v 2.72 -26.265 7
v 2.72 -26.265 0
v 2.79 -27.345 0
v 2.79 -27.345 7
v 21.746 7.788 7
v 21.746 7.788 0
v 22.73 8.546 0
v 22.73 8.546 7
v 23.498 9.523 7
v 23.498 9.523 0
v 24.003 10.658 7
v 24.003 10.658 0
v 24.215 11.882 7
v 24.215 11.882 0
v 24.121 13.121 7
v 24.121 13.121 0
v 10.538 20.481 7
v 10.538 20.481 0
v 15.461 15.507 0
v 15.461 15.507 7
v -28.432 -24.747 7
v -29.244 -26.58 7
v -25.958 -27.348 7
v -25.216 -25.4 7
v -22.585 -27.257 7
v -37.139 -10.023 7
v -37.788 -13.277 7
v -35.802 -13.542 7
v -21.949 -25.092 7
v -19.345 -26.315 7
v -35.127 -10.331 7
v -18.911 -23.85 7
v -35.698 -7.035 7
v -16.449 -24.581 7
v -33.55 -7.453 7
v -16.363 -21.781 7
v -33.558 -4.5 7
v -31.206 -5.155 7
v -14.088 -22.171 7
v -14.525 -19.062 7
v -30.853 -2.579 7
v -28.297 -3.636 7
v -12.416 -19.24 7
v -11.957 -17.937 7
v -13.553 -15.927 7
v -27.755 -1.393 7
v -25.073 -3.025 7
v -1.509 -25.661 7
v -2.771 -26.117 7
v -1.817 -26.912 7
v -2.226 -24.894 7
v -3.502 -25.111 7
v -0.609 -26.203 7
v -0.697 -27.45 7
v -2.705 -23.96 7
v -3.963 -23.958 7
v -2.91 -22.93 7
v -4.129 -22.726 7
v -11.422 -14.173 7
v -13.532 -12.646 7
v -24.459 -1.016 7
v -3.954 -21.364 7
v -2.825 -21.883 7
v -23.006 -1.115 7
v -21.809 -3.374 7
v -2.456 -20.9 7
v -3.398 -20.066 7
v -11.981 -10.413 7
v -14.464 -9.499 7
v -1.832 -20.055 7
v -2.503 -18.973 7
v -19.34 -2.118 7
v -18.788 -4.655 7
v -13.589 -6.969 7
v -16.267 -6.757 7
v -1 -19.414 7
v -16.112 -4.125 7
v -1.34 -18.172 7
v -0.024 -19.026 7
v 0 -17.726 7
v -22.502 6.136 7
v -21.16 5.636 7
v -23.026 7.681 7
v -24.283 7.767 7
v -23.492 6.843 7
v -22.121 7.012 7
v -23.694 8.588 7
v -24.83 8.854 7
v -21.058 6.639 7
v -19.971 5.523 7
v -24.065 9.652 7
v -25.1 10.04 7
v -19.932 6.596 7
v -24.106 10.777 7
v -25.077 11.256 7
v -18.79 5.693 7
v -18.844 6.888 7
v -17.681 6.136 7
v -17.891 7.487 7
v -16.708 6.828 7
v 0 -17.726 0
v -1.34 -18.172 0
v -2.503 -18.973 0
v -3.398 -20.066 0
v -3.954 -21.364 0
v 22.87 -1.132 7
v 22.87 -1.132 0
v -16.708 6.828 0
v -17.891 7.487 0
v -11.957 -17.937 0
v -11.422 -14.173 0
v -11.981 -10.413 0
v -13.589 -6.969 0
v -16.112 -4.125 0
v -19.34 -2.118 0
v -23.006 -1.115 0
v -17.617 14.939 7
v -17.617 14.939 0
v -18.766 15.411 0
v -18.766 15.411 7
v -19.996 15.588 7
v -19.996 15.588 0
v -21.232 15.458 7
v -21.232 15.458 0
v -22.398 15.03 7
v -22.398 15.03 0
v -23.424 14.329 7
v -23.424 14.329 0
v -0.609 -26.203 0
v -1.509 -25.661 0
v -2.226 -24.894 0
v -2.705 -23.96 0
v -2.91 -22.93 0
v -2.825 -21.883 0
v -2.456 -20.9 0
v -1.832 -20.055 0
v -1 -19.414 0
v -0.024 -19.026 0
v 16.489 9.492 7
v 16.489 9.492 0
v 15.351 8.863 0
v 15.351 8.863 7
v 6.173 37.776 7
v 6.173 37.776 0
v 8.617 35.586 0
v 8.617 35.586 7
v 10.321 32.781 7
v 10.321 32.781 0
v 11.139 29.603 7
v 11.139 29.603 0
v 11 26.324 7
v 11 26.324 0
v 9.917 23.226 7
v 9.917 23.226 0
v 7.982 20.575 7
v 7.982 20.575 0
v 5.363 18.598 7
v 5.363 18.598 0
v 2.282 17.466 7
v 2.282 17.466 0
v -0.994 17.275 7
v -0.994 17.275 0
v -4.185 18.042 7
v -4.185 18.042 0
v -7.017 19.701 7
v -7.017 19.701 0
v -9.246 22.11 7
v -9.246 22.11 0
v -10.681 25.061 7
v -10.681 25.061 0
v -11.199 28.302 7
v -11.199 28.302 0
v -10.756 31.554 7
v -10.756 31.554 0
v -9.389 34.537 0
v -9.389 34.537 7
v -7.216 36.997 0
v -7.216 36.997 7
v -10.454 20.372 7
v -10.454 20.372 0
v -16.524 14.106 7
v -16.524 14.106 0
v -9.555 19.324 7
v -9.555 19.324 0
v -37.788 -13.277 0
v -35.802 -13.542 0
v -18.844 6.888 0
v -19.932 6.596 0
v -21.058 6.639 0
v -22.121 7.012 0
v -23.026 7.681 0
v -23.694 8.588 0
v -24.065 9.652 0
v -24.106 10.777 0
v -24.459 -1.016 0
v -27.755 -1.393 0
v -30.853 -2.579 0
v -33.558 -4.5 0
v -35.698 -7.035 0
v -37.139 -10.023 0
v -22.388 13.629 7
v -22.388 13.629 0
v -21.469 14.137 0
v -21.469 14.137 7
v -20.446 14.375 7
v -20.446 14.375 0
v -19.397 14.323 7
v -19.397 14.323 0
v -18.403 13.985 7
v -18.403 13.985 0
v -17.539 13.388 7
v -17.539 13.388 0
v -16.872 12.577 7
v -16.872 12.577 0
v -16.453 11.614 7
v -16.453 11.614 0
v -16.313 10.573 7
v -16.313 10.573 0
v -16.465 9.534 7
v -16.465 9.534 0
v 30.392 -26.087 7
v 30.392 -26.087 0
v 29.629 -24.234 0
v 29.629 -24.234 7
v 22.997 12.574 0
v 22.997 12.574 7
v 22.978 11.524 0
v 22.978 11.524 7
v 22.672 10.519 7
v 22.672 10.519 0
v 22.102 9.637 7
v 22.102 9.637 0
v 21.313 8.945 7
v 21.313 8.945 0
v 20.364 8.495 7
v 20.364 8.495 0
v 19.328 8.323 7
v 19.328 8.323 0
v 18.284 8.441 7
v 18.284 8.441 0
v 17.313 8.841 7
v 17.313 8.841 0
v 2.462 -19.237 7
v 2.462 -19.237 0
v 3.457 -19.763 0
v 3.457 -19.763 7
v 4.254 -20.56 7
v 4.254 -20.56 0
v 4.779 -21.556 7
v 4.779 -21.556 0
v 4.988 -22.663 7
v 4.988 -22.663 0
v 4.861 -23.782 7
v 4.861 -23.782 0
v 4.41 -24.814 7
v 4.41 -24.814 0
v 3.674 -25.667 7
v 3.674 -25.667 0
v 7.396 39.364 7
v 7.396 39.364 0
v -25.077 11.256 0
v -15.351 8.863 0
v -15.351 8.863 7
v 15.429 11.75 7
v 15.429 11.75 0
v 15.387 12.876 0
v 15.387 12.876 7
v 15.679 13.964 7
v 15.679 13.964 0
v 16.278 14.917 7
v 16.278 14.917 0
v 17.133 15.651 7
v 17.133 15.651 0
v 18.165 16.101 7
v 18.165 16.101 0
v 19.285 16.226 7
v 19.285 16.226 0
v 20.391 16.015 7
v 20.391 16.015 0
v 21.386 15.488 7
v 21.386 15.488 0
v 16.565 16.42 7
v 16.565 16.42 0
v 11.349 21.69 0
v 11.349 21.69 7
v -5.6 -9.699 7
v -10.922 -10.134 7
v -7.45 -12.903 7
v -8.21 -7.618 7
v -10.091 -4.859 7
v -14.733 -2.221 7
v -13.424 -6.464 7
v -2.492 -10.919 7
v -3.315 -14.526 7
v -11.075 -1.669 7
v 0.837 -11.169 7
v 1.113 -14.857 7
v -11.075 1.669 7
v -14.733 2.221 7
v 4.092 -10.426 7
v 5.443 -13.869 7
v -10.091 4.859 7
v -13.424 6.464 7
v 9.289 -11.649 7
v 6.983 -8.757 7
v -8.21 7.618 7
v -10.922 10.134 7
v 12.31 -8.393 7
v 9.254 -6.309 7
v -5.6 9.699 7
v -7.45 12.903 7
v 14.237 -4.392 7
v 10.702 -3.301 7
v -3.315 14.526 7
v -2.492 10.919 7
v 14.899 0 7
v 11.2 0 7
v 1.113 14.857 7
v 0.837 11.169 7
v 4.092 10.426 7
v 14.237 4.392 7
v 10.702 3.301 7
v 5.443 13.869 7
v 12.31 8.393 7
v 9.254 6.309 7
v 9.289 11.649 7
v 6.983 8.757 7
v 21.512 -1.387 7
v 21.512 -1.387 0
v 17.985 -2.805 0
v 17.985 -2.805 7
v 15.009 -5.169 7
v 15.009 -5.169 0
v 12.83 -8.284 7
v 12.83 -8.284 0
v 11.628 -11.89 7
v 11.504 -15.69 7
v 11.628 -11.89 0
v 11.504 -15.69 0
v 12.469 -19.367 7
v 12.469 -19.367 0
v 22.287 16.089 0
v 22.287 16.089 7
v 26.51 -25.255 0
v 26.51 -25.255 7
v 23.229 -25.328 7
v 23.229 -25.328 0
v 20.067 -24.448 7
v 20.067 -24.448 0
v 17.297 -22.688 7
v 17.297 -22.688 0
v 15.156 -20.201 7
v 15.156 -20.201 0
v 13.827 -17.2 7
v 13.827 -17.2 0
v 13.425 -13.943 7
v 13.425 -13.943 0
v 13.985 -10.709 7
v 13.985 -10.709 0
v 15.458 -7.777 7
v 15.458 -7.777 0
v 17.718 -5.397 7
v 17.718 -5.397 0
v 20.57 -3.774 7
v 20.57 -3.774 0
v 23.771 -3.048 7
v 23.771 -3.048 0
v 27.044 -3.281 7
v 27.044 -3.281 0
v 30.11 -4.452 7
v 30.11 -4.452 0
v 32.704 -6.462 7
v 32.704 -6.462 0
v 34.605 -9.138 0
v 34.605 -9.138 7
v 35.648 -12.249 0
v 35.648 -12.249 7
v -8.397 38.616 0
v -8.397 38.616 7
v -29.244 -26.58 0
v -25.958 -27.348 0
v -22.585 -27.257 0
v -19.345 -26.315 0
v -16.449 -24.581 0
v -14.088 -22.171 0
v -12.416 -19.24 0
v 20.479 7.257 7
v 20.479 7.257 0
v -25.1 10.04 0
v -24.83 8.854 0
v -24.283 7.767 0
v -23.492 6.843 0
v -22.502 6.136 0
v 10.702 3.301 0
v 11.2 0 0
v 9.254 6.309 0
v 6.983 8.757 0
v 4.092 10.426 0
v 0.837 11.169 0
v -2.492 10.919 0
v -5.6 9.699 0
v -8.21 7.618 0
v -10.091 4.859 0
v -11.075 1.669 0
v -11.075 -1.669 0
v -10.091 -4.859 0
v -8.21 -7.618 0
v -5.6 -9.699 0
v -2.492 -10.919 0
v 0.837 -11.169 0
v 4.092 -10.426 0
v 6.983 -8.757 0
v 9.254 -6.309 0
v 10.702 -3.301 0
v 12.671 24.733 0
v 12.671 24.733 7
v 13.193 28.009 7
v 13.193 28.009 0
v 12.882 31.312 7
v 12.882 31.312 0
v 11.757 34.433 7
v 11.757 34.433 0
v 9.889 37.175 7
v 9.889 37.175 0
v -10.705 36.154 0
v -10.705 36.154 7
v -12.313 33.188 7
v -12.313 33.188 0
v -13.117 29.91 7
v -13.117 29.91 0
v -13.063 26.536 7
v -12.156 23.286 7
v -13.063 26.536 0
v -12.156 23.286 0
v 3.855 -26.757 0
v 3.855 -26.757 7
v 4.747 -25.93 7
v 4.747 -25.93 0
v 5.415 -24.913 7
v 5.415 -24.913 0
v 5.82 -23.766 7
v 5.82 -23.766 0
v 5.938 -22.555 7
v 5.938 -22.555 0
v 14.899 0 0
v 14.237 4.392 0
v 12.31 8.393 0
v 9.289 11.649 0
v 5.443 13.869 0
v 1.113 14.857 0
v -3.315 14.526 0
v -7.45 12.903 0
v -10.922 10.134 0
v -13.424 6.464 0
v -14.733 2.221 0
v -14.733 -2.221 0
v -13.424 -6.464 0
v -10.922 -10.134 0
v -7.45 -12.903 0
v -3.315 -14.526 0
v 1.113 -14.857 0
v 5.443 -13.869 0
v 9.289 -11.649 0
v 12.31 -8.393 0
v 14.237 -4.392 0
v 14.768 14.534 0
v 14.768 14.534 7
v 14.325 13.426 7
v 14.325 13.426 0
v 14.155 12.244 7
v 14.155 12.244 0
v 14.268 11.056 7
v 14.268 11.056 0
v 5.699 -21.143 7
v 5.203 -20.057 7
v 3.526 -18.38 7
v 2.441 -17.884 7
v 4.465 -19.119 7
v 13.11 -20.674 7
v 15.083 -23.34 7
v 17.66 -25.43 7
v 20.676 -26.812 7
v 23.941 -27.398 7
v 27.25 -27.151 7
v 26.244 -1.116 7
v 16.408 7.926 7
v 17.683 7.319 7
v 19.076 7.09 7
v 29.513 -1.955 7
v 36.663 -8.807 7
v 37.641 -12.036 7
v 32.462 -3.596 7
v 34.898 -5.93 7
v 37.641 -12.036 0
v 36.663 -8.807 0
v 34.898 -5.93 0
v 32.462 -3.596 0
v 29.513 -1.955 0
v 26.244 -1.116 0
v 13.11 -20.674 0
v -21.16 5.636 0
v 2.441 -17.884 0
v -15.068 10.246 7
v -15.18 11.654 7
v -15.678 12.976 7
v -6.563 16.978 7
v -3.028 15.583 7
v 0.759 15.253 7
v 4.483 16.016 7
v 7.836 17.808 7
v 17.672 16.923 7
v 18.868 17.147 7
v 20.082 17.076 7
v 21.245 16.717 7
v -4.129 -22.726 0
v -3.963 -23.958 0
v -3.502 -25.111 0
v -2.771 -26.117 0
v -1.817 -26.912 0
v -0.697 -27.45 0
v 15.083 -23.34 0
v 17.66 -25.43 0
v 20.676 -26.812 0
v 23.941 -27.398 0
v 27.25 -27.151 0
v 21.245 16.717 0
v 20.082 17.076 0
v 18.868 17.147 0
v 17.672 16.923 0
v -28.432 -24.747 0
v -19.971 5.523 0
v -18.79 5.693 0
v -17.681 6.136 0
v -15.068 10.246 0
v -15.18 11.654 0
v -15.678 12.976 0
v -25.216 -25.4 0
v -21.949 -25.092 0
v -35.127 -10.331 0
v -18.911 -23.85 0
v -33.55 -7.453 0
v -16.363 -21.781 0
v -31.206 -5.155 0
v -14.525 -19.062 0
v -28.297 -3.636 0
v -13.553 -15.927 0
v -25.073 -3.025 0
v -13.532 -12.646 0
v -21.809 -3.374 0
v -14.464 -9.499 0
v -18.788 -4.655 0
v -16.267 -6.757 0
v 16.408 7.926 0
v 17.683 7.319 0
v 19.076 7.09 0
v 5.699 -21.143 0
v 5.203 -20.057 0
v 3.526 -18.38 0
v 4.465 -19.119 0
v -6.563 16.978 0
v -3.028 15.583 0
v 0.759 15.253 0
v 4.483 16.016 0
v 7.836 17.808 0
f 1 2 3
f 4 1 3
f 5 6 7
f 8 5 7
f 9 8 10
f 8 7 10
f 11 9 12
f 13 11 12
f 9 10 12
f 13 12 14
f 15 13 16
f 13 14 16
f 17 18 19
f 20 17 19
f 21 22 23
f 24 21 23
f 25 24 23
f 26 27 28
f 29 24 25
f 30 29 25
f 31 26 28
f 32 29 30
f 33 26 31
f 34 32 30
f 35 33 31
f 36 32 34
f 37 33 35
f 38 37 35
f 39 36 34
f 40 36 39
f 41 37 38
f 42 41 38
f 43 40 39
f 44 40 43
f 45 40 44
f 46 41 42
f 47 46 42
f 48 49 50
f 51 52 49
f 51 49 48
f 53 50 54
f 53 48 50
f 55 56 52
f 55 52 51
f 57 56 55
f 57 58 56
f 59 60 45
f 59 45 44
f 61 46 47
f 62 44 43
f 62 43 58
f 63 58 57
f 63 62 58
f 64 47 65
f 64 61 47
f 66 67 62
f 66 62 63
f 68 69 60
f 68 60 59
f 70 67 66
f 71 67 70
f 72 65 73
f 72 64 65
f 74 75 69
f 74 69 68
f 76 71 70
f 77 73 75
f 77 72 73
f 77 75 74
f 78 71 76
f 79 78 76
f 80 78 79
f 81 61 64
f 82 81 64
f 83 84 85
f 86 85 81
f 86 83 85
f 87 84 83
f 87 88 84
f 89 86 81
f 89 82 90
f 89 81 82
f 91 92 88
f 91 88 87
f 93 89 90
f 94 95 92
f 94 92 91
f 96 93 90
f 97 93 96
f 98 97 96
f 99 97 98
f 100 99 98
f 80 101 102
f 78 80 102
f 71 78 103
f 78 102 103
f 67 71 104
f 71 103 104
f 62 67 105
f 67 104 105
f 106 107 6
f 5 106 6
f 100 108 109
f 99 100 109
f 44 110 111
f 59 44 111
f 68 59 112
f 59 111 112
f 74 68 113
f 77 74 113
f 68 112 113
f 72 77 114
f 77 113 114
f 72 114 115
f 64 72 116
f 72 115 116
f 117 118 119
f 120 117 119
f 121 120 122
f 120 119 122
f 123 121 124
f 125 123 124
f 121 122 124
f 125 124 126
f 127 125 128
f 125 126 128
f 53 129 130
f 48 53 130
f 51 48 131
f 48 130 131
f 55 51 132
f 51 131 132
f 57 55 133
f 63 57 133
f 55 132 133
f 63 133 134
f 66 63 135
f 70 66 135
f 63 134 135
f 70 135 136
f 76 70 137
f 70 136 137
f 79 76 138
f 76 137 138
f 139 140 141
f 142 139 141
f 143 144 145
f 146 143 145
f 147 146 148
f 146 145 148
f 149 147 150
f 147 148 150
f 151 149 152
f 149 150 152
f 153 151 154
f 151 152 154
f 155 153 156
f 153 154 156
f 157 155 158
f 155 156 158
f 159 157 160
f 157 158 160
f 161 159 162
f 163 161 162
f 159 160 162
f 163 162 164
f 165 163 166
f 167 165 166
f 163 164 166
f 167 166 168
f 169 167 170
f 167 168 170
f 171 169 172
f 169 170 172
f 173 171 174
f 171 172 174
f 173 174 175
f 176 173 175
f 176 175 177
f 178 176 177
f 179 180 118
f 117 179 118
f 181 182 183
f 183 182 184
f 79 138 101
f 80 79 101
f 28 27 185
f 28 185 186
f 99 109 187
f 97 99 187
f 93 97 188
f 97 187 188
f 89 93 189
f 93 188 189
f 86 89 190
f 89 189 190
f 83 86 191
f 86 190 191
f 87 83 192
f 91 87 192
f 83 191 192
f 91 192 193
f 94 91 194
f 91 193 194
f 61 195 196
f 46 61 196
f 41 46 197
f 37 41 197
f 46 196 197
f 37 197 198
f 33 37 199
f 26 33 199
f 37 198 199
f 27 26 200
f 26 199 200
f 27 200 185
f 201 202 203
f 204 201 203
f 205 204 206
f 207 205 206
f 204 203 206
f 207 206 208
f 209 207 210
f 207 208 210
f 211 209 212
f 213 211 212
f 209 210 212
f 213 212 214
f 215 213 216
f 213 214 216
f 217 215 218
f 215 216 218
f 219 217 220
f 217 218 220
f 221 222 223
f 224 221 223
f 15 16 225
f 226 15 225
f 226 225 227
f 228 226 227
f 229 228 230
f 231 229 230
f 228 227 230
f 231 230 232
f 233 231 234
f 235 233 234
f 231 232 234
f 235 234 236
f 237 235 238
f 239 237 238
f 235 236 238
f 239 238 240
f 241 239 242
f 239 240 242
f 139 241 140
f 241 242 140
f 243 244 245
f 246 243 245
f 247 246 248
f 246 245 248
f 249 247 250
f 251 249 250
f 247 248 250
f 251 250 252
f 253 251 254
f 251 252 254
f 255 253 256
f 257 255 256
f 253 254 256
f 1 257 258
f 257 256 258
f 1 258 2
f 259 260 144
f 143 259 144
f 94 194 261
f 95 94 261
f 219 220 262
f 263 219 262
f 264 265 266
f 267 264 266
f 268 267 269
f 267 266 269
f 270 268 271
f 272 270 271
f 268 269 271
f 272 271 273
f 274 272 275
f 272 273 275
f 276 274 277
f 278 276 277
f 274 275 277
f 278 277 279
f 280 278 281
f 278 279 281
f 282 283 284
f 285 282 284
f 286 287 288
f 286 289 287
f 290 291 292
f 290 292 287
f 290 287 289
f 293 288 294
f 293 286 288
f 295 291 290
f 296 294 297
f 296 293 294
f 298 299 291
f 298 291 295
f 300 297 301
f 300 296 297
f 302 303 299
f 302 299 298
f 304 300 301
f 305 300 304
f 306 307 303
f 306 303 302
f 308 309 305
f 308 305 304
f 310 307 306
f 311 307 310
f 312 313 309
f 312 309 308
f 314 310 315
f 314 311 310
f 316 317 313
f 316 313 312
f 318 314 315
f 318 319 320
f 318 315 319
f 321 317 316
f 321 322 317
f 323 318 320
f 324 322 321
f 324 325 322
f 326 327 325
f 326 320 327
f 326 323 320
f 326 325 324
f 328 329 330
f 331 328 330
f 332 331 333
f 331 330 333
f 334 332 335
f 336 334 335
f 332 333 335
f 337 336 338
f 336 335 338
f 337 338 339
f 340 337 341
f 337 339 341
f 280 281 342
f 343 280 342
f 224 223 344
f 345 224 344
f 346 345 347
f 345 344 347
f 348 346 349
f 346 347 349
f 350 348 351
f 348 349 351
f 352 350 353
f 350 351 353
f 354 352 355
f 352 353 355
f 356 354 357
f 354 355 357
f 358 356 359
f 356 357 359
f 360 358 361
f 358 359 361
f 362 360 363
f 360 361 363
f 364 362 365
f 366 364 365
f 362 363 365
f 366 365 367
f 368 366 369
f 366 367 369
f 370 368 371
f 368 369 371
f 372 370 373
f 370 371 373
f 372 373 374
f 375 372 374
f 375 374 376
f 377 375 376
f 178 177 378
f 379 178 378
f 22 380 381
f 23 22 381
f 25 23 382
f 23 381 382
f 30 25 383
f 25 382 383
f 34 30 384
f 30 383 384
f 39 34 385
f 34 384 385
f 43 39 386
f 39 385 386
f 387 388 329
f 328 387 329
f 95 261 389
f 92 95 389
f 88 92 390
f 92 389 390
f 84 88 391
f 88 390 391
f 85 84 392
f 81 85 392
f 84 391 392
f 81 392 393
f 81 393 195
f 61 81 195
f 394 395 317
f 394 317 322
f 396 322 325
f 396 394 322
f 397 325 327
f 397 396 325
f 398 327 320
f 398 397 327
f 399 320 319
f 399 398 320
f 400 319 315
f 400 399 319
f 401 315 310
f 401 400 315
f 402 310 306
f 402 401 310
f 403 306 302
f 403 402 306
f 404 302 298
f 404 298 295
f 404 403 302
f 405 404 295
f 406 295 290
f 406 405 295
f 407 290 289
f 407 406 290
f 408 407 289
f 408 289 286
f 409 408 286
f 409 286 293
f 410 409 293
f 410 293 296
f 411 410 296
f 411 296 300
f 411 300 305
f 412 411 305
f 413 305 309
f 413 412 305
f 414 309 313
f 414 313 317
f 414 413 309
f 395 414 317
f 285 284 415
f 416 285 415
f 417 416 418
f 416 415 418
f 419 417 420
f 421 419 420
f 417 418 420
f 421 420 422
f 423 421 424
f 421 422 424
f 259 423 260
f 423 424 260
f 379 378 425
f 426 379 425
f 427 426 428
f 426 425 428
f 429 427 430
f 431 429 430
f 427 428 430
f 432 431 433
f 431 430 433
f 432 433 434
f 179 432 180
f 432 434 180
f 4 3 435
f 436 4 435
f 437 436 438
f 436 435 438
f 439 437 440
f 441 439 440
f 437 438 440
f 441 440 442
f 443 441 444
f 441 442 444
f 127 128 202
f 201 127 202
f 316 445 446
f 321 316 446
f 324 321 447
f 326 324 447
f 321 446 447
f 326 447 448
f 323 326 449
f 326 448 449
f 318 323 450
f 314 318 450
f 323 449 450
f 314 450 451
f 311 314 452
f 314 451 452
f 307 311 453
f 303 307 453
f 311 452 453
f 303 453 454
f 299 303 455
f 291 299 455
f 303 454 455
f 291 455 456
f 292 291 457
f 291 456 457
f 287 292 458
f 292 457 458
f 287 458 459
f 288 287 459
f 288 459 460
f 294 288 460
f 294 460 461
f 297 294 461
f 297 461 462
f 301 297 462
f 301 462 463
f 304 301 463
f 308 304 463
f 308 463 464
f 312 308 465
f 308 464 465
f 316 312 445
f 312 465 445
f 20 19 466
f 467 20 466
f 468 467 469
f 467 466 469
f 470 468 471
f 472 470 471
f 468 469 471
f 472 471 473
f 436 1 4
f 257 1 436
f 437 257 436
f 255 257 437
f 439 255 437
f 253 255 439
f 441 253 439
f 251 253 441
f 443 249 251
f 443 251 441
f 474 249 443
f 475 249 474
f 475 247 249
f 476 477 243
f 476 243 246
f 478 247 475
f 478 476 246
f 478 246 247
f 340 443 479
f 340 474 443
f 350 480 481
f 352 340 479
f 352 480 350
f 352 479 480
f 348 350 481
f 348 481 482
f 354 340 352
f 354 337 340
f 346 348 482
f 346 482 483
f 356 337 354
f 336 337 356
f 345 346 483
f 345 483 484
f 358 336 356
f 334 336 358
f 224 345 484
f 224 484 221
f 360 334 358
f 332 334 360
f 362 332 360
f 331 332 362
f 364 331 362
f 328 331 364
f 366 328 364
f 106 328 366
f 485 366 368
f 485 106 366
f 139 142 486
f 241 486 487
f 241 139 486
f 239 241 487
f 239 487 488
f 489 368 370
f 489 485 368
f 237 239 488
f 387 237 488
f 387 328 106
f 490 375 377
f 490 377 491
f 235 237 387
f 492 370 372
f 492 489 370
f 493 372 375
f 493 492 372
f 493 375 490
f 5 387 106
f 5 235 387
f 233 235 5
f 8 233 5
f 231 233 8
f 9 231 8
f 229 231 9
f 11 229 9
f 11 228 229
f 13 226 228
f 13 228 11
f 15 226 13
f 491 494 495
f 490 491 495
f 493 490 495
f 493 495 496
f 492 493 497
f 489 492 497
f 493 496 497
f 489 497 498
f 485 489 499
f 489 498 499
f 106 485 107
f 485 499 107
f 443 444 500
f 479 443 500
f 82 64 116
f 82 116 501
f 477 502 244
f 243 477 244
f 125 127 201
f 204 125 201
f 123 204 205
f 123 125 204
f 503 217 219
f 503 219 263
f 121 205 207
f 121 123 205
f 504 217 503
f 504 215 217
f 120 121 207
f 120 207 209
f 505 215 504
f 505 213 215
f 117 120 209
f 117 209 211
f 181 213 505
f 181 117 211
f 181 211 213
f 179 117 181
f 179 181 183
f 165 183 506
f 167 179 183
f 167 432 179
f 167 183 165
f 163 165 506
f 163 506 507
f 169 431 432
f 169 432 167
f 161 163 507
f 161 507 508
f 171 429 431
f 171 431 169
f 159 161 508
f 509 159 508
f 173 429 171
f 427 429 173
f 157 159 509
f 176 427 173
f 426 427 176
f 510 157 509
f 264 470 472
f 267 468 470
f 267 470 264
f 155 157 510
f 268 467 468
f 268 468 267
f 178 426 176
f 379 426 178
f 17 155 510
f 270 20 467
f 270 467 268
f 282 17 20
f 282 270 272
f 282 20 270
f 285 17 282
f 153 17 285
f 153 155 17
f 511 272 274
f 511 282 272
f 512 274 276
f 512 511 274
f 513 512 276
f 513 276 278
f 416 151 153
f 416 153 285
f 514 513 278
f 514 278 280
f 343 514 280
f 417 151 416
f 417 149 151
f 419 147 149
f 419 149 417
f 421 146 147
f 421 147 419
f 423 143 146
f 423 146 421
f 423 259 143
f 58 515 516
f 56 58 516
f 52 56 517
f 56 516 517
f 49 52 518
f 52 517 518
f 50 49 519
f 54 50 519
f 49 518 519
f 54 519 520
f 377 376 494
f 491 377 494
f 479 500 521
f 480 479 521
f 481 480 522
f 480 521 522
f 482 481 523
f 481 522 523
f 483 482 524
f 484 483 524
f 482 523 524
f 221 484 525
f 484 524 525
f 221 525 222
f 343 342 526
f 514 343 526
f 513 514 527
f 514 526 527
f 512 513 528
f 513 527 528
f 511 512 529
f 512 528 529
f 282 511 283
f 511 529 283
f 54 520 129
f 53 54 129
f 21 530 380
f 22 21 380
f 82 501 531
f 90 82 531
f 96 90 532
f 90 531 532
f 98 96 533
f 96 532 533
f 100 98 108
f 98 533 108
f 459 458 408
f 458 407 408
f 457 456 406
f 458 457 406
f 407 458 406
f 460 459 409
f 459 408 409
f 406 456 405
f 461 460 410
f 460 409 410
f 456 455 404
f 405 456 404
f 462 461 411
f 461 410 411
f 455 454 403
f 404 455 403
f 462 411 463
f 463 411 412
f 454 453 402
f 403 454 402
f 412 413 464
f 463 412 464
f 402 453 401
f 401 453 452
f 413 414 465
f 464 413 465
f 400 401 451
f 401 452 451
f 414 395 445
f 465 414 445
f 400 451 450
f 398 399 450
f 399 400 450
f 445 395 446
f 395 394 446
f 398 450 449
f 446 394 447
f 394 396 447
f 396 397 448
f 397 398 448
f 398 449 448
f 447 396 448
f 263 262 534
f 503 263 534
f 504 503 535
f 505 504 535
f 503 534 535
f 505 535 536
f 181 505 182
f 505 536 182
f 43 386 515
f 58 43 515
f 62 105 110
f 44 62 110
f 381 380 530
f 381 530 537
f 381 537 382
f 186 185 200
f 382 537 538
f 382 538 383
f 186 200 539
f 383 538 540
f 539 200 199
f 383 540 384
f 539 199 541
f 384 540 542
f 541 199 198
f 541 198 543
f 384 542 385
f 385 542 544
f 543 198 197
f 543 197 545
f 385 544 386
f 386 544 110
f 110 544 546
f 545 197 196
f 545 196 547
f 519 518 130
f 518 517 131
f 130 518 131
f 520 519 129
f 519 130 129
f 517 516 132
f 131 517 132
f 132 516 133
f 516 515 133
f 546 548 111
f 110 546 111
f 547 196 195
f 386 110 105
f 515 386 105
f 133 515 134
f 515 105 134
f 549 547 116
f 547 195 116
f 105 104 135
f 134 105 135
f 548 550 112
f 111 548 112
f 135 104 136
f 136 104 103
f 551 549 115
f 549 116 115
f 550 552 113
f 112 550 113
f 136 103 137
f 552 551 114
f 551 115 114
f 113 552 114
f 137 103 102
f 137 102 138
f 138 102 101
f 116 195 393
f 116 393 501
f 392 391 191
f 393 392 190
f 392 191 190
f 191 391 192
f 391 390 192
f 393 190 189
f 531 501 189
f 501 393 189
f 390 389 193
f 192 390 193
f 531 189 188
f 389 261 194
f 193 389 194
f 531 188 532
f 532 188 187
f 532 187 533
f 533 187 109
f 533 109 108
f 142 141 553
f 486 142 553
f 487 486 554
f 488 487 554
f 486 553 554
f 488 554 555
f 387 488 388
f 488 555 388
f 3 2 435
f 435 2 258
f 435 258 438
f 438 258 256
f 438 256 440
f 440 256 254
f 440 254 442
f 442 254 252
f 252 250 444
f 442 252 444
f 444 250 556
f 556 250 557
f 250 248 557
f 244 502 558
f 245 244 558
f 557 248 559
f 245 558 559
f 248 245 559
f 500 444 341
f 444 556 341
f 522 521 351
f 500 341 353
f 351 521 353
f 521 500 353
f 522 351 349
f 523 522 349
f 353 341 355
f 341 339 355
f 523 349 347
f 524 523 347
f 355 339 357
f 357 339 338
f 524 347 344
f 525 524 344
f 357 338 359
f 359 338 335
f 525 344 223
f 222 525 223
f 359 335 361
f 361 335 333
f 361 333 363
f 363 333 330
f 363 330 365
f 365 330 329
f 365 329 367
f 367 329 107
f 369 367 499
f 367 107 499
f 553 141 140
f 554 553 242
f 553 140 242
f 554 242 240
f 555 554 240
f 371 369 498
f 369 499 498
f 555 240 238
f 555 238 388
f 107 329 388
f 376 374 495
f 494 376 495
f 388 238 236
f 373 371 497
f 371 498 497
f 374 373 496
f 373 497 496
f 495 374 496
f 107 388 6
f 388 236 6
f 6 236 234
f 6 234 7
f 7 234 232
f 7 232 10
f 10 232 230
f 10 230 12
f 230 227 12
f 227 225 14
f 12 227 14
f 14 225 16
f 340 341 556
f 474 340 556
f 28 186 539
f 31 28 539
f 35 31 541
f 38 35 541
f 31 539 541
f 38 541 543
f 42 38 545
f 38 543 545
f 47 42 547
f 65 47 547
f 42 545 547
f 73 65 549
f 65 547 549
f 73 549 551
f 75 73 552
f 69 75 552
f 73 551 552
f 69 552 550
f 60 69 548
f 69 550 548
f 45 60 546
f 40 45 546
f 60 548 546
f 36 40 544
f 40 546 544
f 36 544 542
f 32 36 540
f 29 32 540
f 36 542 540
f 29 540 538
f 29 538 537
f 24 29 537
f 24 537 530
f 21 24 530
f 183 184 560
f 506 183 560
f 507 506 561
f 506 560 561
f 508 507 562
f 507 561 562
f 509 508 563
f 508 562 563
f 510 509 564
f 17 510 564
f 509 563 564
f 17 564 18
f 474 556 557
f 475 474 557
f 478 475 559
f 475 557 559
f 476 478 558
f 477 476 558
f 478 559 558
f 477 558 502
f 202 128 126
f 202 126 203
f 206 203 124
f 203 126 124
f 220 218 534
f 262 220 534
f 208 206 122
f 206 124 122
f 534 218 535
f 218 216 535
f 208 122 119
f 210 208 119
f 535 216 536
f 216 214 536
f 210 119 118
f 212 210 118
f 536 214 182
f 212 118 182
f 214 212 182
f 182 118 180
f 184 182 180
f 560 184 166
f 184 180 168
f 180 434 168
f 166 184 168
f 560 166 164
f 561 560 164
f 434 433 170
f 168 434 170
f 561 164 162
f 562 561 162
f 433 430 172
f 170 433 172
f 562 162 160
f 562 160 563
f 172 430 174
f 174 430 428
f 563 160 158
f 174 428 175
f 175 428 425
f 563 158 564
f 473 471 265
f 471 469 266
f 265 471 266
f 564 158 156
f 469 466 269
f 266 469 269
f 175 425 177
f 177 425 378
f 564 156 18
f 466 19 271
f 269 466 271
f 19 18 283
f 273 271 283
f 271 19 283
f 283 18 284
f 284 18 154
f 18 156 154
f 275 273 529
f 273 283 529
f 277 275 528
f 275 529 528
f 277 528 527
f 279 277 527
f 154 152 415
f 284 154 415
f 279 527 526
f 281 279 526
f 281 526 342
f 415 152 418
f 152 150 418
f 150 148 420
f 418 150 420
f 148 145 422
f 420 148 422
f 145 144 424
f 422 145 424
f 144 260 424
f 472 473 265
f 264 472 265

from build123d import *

# Parameters (mm, degrees)
F1_DEPTH = 7
F0_R     = 14.8991210618
F0_R_2   = 11.2


# Not quite as in the source:
# - a feature names something its author has since deleted; it is built from what else it names


with BuildPart() as f1:
    # F0 (on Top) → F1 (new body)
    with BuildSketch(Plane.XY):
        with BuildLine():
            ThreePointArc((6.1727941676, 37.7762980936), (0.6510319855, 17.2498297116), (-7.2157000853, 36.9967355036))
            Line((-7.2157000853, 36.9967355036), (-8.3966559852, 38.6159875526))
            ThreePointArc((-8.3966559852, 38.6159875526), (-13.1168240349, 29.9103945159), (-10.4544622583, 20.3720945463))
            ThreePointArc((-10.4544622583, 20.3720945463), (-10.0184805962, 19.8361235978), (-9.5550524793, 19.3236987275))
            ThreePointArc((-9.5550524793, 19.3236987275), (0.7593543067, 15.2527518823), (10.5378916113, 20.4814997005))
            ThreePointArc((10.5378916113, 20.4814997005), (10.9601407983, 21.0745810082), (11.3490491279, 21.6900402876))
            ThreePointArc((11.3490491279, 21.6900402876), (12.8817645708, 31.3118887778), (7.3962556563, 39.3641168512))
            Line((7.3962556563, 39.3641168512), (6.1727941676, 37.7762980936))
        make_face()
        with BuildLine():
            ThreePointArc((-9.5550524793, 19.3236987275), (-10.0184805962, 19.8361235978), (-10.4544622583, 20.3720945463))
            Line((-10.4544622583, 20.3720945463), (-17.617265947, 14.9386296298))
            ThreePointArc((-17.617265947, 14.9386296298), (-17.0422715879, 14.5599242823), (-16.5243304598, 14.1063019271))
            Line((-16.5243304598, 14.1063019271), (-9.5550524793, 19.3236987275))
        make_face()
        with BuildLine():
            Line((16.5648326928, 16.4198065392), (11.3490491279, 21.6900402876))
            ThreePointArc((11.3490491279, 21.6900402876), (10.9601407983, 21.0745810082), (10.5378916113, 20.4814997005))
            Line((10.5378916113, 20.4814997005), (15.4607146913, 15.5072847985))
            ThreePointArc((15.4607146913, 15.5072847985), (15.9801506346, 16.0030183777), (16.5648326928, 16.4198065392))
        make_face()
        with BuildLine():
            ThreePointArc((22.2866316895, 16.0892831325), (19.4773626659, 17.1483369014), (16.5648326928, 16.4198065392))
            ThreePointArc((16.5648326928, 16.4198065392), (15.9801506346, 16.0030183777), (15.4607146913, 15.5072847985))
            ThreePointArc((15.4607146913, 15.5072847985), (14.3247325692, 13.4259718238), (14.2675578592, 11.0555182525))
            Line((14.2675578592, 11.0555182525), (15.4289464152, 11.7503366329))
            ThreePointArc((15.4289464152, 11.7503366329), (17.1325780757, 15.6513583871), (21.3862302858, 15.4877294253))
            Line((21.3862302858, 15.4877294253), (22.2866316895, 16.0892831325))
        make_face()
        with BuildLine():
            ThreePointArc((-16.5243304598, 14.1063019271), (-17.0422715879, 14.5599242823), (-17.617265947, 14.9386296298))
            ThreePointArc((-17.617265947, 14.9386296298), (-20.6180729349, 15.5614809861), (-23.423944477, 14.3286503897))
            Line((-23.423944477, 14.3286503897), (-22.387528792, 13.6288879439))
            ThreePointArc((-22.387528792, 13.6288879439), (-17.9500491472, 13.7165086278), (-16.4646953344, 9.534089826))
            Line((-16.4646953344, 9.534089826), (-15.3511392531, 8.8629843801))
            ThreePointArc((-15.3511392531, 8.8629843801), (-15.1796922371, 11.6542550315), (-16.5243304598, 14.1063019271))
        make_face()
    extrude(amount=F1_DEPTH)


with BuildPart() as f1b:
    # F0 (on Top) → F1, piece 2 (new body)
    with BuildSketch(Plane.XY):
        Circle(F0_R)
        Circle(F0_R_2, mode=Mode.SUBTRACT)
    extrude(amount=F1_DEPTH)


with BuildPart() as f1c:
    # F0 (on Top) → F1, piece 3 (new body)
    with BuildSketch(Plane.XY):
        with BuildLine():
            ThreePointArc((29.6288367261, -24.2339456083), (14.6132747484, -9.1887250939), (35.6479628458, -12.2493881719))
            Line((35.6479628458, -12.2493881719), (37.6407542054, -12.0362763863))
            ThreePointArc((37.6407542054, -12.0362763863), (32.4615735054, -3.5956944267), (22.8699825346, -1.1322173746))
            ThreePointArc((22.8699825346, -1.1322173746), (22.1878272464, -1.2418030953), (21.5123402327, -1.3869311822))
            ThreePointArc((21.5123402327, -1.3869311822), (12.8295934543, -8.2839960612), (12.4685532426, -19.3668316879))
            ThreePointArc((12.4685532426, -19.3668316879), (12.7710521281, -20.0290508644), (13.1096013342, -20.6735849973))
            ThreePointArc((13.1096013342, -20.6735849973), (20.6760088367, -26.8118797528), (30.3921973626, -26.0874037168))
            Line((30.3921973626, -26.0874037168), (29.6288367261, -24.2339456083))
        make_face()
        with BuildLine():
            ThreePointArc((21.5123402327, -1.3869311822), (22.1878272464, -1.2418030953), (22.8699825346, -1.1322173746))
            Line((22.8699825346, -1.1322173746), (21.7458657307, 7.7876850405))
            ThreePointArc((21.7458657307, 7.7876850405), (21.1304000996, 7.4790779922), (20.4785810523, 7.2573389952))
            Line((20.4785810523, 7.2573389952), (21.5123402327, -1.3869311822))
        make_face()
        with BuildLine():
            ThreePointArc((20.4785810523, 7.2573389952), (21.1304000996, 7.4790779922), (21.7458657307, 7.7876850405))
            ThreePointArc((21.7458657307, 7.7876850405), (23.7856743219, 10.0750344456), (24.1209474779, 13.1214057791))
            Line((24.1209474779, 13.1214057791), (22.9967275808, 12.5737246899))
            ThreePointArc((22.9967275808, 12.5737246899), (20.8538694965, 8.6869442467), (16.4891116585, 9.4917995122))
            Line((16.4891116585, 9.4917995122), (15.3511392531, 8.8629843801))
            ThreePointArc((15.3511392531, 8.8629843801), (17.682727038, 7.3188715832), (20.4785810523, 7.2573389952))
        make_face()
        with BuildLine():
            Line((5.9375532417, -22.555469191), (13.1096013342, -20.6735849973))
            ThreePointArc((13.1096013342, -20.6735849973), (12.7710521281, -20.0290508644), (12.4685532426, -19.3668316879))
            Line((12.4685532426, -19.3668316879), (5.6993452336, -21.1430140826))
            ThreePointArc((5.6993452336, -21.1430140826), (5.868945135, -21.8407255947), (5.9375532417, -22.555469191))
        make_face()
        with BuildLine():
            ThreePointArc((2.7904120767, -27.3454307742), (5.1122140563, -25.4420593181), (5.9375532417, -22.555469191))
            ThreePointArc((5.9375532417, -22.555469191), (5.868945135, -21.8407255947), (5.6993452336, -21.1430140826))
            ThreePointArc((5.6993452336, -21.1430140826), (4.4648663853, -19.1185682192), (2.4405807291, -17.8838266823))
            Line((2.4405807291, -17.8838266823), (2.4616168195, -19.2370278656))
            ThreePointArc((2.4616168195, -19.2370278656), (4.9881849291, -22.6629270394), (2.7196519863, -26.2648834313))
            Line((2.7196519863, -26.2648834313), (2.7904120767, -27.3454307742))
        make_face()
    extrude(amount=F1_DEPTH)


with BuildPart() as f1d:
    # F0 (on Top) → F1, piece 4 (new body)
    with BuildSketch(Plane.XY):
        with BuildLine():
            ThreePointArc((-25.0770437662, 11.2561476417), (-24.5895767222, 8.2937224167), (-22.5023859345, 6.1356626518))
            ThreePointArc((-22.5023859345, 6.1356626518), (-21.8490957696, 5.837707217), (-21.1600599249, 5.6357292841))
            ThreePointArc((-21.1600599249, 5.6357292841), (-18.7895989545, 5.6925963955), (-16.7081385883, 6.8283084297))
            Line((-16.7081385883, 6.8283084297), (-17.8905632347, 7.4866912328))
            ThreePointArc((-17.8905632347, 7.4866912328), (-22.1207630048, 7.0115686523), (-24.1058822721, 10.7771540061))
            Line((-24.1058822721, 10.7771540061), (-25.0770437662, 11.2561476417))
        make_face()
        with BuildLine():
            ThreePointArc((-35.8016308938, -13.5423524853), (-15.264306734, -8.0611046177), (-28.4322627606, -24.7473473317))
            Line((-28.4322627606, -24.7473473317), (-29.2440982202, -26.5797111663))
            ThreePointArc((-29.2440982202, -26.5797111663), (-19.3447494705, -26.3147000891), (-12.4155202763, -19.2398771717))
            ThreePointArc((-12.4155202763, -19.2398771717), (-12.1693466502, -18.5943205025), (-11.9572877534, -17.9367675453))
            ThreePointArc((-11.9572877534, -17.9367675453), (-13.588947761, -6.968755821), (-23.0064448539, -1.1146680126))
            ThreePointArc((-23.0064448539, -1.1146680126), (-23.7311929263, -1.0455301438), (-24.4586504621, -1.0164552902))
            ThreePointArc((-24.4586504621, -1.0164552902), (-33.5577734074, -4.500009025), (-37.7884530188, -13.2767131344))
            Line((-37.7884530188, -13.2767131344), (-35.8016308938, -13.5423524853))
        make_face()
        with BuildLine():
            Line((-22.5023859345, 6.1356626518), (-24.4586504621, -1.0164552902))
            ThreePointArc((-24.4586504621, -1.0164552902), (-23.7311929263, -1.0455301438), (-23.0064448539, -1.1146680126))
            Line((-23.0064448539, -1.1146680126), (-21.1600599249, 5.6357292841))
            ThreePointArc((-21.1600599249, 5.6357292841), (-21.8490957696, 5.837707217), (-22.5023859345, 6.1356626518))
        make_face()
        with BuildLine():
            ThreePointArc((-11.9572877534, -17.9367675453), (-12.1693466502, -18.5943205025), (-12.4155202763, -19.2398771717))
            Line((-12.4155202763, -19.2398771717), (-4.1285997836, -22.7263146703))
            ThreePointArc((-4.1285997836, -22.7263146703), (-4.0881285117, -22.0390022745), (-3.9542505924, -21.3636409223))
            Line((-3.9542505924, -21.3636409223), (-11.9572877534, -17.9367675453))
        make_face()
        with BuildLine():
            ThreePointArc((-3.9542505924, -21.3636409223), (-4.0881285117, -22.0390022745), (-4.1285997836, -22.7263146703))
            ThreePointArc((-4.1285997836, -22.7263146703), (-3.1676013871, -25.6365154318), (-0.6970030009, -27.4500561688))
            Line((-0.6970030009, -27.4500561688), (-0.6091987888, -26.2026126338))
            ThreePointArc((-0.6091987888, -26.2026126338), (-2.9038203493, -22.4034528746), (-0.0244163241, -19.0258893382))
            Line((-0.0244163241, -19.0258893382), (0, -17.7259687602))
            ThreePointArc((0, -17.7259687602), (-2.5030348009, -18.9731266147), (-3.9542505924, -21.3636409223))
        make_face()
    extrude(amount=F1_DEPTH)


solid = Compound([f1.part, f1b.part, f1c.part, f1d.part])
